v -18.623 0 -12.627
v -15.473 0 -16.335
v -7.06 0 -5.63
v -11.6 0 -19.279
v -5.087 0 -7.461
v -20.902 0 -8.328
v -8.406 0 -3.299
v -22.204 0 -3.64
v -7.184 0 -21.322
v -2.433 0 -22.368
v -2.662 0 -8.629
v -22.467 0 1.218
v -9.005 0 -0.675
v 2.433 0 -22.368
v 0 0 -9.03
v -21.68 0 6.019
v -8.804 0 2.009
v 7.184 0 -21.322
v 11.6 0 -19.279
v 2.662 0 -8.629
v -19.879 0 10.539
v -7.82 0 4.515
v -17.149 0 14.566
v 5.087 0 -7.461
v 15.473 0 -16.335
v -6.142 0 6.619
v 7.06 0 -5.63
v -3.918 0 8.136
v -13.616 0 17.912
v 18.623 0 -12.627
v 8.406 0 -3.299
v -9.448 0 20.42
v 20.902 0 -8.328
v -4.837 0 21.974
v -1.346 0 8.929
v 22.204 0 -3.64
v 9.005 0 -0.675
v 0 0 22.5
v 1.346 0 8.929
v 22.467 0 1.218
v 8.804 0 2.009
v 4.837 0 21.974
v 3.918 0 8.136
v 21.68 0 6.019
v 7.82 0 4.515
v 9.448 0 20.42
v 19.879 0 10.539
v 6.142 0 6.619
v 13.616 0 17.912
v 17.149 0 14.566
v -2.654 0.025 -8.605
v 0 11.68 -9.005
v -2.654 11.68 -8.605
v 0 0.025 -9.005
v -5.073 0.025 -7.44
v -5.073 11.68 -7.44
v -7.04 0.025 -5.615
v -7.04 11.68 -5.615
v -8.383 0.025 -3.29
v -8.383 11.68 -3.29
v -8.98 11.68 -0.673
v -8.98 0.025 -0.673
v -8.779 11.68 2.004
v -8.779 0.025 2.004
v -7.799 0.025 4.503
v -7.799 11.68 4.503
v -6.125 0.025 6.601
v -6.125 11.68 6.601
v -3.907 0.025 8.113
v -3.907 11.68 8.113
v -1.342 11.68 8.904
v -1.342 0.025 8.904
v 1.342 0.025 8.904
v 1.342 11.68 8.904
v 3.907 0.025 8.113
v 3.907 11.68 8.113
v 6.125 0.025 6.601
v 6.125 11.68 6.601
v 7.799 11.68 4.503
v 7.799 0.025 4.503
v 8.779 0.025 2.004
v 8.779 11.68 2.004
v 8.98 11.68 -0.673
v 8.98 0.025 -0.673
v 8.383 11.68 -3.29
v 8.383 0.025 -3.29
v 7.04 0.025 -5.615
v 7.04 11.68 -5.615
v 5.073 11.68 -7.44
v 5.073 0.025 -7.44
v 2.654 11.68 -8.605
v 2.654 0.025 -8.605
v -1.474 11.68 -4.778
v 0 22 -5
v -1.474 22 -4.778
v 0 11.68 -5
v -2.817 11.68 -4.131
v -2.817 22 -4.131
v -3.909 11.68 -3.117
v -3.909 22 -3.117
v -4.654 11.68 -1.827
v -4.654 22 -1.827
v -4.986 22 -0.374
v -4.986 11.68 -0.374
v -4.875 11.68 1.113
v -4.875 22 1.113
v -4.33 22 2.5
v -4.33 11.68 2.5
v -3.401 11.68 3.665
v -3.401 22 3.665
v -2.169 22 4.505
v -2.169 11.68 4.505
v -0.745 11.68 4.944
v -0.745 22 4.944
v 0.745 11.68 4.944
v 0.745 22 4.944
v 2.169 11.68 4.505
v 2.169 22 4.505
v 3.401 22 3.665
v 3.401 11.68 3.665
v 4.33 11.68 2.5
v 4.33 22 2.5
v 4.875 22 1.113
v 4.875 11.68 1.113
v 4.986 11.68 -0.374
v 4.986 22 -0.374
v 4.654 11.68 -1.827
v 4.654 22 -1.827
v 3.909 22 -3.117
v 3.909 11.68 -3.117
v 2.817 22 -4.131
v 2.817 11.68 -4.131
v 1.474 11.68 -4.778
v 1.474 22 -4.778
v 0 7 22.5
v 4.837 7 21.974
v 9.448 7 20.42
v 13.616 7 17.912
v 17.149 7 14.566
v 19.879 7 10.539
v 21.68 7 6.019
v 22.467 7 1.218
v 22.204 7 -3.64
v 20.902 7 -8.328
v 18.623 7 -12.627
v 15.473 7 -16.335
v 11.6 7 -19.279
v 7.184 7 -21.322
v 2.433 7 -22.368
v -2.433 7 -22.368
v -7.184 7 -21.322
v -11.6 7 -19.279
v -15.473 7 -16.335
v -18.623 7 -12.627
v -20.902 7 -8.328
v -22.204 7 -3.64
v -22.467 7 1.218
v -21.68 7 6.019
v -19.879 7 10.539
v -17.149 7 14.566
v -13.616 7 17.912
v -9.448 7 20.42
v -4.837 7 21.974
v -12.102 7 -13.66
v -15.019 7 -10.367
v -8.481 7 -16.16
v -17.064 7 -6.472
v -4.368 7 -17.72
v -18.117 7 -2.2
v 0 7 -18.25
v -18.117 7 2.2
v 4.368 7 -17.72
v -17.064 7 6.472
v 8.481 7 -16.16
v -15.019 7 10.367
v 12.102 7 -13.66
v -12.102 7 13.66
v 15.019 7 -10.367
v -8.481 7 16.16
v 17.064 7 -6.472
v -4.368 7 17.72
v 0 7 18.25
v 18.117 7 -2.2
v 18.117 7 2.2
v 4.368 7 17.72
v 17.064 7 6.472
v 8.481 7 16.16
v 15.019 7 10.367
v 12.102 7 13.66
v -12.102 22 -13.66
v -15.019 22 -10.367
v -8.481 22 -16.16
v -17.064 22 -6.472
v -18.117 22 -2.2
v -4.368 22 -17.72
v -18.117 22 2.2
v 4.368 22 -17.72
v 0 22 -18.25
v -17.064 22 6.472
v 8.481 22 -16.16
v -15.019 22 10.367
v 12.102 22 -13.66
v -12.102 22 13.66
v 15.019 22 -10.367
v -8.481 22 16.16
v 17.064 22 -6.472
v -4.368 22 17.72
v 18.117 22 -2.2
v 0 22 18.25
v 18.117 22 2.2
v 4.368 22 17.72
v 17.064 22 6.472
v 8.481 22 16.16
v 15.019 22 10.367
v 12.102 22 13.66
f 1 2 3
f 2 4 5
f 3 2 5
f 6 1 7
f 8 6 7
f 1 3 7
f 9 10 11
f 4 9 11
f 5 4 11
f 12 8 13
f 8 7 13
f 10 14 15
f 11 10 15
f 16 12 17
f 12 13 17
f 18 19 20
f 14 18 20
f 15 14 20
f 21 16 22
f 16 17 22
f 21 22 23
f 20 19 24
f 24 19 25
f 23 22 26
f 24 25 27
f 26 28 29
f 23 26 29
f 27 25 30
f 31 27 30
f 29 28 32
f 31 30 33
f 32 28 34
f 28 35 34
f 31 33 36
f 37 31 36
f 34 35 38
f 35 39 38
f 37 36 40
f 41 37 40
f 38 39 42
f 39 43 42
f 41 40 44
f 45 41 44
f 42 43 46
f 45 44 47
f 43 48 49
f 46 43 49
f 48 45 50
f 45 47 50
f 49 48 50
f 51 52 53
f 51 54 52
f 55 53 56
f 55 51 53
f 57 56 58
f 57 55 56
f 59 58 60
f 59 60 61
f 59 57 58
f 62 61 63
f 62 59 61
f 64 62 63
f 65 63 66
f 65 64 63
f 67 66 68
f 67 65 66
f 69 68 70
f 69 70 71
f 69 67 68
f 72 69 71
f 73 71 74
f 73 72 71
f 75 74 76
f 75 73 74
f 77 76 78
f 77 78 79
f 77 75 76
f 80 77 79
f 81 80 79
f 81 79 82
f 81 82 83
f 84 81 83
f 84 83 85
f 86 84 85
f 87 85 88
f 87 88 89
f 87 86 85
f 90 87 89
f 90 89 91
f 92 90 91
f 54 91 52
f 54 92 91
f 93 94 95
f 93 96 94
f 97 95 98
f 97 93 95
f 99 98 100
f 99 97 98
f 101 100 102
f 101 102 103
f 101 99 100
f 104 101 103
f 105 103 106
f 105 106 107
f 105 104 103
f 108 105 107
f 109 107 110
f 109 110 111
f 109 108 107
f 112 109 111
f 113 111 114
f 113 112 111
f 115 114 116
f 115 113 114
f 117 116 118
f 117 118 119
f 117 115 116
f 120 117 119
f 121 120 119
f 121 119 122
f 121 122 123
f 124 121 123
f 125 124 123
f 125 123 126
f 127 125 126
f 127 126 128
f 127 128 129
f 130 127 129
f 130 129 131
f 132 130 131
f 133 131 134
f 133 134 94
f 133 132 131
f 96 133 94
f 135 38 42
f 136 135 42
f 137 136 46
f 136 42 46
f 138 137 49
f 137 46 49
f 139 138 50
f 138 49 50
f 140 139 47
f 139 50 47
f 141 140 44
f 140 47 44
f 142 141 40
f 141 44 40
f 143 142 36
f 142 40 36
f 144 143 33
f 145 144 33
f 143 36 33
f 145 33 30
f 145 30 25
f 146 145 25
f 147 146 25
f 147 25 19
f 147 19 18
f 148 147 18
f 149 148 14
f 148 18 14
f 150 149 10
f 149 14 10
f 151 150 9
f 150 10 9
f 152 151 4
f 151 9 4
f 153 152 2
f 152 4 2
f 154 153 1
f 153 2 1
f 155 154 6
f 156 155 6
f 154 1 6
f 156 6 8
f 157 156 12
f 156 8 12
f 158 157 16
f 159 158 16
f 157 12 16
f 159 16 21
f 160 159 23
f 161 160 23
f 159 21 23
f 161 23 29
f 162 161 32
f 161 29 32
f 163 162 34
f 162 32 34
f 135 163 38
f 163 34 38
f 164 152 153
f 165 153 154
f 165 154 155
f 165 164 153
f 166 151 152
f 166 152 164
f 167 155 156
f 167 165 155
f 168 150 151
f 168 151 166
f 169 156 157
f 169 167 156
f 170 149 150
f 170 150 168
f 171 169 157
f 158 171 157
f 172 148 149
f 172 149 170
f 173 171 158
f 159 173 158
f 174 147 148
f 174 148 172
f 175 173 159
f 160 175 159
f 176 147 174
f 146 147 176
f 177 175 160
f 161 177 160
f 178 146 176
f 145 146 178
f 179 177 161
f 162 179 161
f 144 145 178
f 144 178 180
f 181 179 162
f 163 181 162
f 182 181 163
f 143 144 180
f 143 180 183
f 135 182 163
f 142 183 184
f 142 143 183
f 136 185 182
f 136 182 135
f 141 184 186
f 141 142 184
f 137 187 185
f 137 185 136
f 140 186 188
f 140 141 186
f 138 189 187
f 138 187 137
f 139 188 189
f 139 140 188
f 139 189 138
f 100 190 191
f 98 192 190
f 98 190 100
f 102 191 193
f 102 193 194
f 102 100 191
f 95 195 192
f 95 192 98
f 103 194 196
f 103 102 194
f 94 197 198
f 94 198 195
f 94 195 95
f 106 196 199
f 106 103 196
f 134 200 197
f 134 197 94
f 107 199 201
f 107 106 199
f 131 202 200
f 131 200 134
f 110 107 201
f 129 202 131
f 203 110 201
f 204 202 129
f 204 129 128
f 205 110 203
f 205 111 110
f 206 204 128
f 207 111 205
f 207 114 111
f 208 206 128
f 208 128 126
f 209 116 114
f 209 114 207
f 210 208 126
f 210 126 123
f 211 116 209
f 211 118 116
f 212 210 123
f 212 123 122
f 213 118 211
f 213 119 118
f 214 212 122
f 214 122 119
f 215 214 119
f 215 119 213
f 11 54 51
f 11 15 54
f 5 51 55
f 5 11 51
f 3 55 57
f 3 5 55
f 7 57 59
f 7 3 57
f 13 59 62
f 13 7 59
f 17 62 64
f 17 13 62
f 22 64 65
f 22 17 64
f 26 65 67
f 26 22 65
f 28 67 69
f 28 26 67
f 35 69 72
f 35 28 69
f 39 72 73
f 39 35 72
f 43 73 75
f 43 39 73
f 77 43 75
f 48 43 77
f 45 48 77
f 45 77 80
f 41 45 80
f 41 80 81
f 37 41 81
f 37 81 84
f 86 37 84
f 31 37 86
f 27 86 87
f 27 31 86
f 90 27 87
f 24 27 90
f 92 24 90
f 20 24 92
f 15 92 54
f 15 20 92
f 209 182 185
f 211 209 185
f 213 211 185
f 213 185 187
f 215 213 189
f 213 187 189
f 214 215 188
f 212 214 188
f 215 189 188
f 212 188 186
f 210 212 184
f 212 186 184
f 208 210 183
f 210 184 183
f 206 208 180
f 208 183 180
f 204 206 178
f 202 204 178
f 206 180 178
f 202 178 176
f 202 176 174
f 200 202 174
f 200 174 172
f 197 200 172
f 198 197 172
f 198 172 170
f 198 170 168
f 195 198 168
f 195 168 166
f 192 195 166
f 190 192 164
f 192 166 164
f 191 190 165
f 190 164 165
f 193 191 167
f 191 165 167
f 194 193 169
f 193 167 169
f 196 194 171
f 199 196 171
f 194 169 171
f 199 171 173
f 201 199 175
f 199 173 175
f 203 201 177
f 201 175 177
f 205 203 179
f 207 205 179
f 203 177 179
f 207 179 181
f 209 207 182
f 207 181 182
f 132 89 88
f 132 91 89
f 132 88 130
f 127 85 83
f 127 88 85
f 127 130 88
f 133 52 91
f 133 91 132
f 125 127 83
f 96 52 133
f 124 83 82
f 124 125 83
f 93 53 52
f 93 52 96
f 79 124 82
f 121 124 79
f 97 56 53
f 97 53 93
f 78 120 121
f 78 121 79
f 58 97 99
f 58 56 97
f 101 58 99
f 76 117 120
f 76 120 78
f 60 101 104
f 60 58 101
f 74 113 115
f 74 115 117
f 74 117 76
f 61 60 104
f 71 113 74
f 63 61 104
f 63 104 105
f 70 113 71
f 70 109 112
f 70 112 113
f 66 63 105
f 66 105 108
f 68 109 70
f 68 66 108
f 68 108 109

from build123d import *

# Parameters (mm, degrees)
SKETCH2_R           = 22.5
BOSS_EXTRUDE1_DEPTH = 7
SKETCH3_R           = 18.25
BOSS_EXTRUDE2_DEPTH = 15


with BuildPart() as part:
    # Sketch2 → Boss-Extrude1 (new body)
    with BuildSketch(Plane(origin=(0, 0, 0), x_dir=(1, 0, 0), z_dir=(0, 1, 0))):
        with Locations(Location((0, 0, 0), (0, 0, 270))):
            Circle(SKETCH2_R)
    extrude(amount=BOSS_EXTRUDE1_DEPTH)

    # Sketch3 → Boss-Extrude2 (add)
    with BuildSketch(Plane(origin=(0, 7, 0), x_dir=(1, 0, 0), z_dir=(0, 1, 0))):
        with Locations(Location((0, 0, 0), (0, 0, 270))):
            Circle(SKETCH3_R)
    extrude(amount=BOSS_EXTRUDE2_DEPTH)

    # Sketch5 → CBORE for M8 Hex Head Bolt1 (revolve, cut)
    with BuildSketch(Plane(origin=(0, 0, 0), x_dir=(0, 0, -1), z_dir=(1, 0, 0))):
        Polygon((0, 0), (0, 22), (5, 22), (5, 11.68), (9.005, 11.68), (9.005, 0.025), (9.03, 0), align=None)
    revolve(axis=Axis((0, -6.35, 0), (0, 1, 0)), mode=Mode.SUBTRACT)


solid = part.part
